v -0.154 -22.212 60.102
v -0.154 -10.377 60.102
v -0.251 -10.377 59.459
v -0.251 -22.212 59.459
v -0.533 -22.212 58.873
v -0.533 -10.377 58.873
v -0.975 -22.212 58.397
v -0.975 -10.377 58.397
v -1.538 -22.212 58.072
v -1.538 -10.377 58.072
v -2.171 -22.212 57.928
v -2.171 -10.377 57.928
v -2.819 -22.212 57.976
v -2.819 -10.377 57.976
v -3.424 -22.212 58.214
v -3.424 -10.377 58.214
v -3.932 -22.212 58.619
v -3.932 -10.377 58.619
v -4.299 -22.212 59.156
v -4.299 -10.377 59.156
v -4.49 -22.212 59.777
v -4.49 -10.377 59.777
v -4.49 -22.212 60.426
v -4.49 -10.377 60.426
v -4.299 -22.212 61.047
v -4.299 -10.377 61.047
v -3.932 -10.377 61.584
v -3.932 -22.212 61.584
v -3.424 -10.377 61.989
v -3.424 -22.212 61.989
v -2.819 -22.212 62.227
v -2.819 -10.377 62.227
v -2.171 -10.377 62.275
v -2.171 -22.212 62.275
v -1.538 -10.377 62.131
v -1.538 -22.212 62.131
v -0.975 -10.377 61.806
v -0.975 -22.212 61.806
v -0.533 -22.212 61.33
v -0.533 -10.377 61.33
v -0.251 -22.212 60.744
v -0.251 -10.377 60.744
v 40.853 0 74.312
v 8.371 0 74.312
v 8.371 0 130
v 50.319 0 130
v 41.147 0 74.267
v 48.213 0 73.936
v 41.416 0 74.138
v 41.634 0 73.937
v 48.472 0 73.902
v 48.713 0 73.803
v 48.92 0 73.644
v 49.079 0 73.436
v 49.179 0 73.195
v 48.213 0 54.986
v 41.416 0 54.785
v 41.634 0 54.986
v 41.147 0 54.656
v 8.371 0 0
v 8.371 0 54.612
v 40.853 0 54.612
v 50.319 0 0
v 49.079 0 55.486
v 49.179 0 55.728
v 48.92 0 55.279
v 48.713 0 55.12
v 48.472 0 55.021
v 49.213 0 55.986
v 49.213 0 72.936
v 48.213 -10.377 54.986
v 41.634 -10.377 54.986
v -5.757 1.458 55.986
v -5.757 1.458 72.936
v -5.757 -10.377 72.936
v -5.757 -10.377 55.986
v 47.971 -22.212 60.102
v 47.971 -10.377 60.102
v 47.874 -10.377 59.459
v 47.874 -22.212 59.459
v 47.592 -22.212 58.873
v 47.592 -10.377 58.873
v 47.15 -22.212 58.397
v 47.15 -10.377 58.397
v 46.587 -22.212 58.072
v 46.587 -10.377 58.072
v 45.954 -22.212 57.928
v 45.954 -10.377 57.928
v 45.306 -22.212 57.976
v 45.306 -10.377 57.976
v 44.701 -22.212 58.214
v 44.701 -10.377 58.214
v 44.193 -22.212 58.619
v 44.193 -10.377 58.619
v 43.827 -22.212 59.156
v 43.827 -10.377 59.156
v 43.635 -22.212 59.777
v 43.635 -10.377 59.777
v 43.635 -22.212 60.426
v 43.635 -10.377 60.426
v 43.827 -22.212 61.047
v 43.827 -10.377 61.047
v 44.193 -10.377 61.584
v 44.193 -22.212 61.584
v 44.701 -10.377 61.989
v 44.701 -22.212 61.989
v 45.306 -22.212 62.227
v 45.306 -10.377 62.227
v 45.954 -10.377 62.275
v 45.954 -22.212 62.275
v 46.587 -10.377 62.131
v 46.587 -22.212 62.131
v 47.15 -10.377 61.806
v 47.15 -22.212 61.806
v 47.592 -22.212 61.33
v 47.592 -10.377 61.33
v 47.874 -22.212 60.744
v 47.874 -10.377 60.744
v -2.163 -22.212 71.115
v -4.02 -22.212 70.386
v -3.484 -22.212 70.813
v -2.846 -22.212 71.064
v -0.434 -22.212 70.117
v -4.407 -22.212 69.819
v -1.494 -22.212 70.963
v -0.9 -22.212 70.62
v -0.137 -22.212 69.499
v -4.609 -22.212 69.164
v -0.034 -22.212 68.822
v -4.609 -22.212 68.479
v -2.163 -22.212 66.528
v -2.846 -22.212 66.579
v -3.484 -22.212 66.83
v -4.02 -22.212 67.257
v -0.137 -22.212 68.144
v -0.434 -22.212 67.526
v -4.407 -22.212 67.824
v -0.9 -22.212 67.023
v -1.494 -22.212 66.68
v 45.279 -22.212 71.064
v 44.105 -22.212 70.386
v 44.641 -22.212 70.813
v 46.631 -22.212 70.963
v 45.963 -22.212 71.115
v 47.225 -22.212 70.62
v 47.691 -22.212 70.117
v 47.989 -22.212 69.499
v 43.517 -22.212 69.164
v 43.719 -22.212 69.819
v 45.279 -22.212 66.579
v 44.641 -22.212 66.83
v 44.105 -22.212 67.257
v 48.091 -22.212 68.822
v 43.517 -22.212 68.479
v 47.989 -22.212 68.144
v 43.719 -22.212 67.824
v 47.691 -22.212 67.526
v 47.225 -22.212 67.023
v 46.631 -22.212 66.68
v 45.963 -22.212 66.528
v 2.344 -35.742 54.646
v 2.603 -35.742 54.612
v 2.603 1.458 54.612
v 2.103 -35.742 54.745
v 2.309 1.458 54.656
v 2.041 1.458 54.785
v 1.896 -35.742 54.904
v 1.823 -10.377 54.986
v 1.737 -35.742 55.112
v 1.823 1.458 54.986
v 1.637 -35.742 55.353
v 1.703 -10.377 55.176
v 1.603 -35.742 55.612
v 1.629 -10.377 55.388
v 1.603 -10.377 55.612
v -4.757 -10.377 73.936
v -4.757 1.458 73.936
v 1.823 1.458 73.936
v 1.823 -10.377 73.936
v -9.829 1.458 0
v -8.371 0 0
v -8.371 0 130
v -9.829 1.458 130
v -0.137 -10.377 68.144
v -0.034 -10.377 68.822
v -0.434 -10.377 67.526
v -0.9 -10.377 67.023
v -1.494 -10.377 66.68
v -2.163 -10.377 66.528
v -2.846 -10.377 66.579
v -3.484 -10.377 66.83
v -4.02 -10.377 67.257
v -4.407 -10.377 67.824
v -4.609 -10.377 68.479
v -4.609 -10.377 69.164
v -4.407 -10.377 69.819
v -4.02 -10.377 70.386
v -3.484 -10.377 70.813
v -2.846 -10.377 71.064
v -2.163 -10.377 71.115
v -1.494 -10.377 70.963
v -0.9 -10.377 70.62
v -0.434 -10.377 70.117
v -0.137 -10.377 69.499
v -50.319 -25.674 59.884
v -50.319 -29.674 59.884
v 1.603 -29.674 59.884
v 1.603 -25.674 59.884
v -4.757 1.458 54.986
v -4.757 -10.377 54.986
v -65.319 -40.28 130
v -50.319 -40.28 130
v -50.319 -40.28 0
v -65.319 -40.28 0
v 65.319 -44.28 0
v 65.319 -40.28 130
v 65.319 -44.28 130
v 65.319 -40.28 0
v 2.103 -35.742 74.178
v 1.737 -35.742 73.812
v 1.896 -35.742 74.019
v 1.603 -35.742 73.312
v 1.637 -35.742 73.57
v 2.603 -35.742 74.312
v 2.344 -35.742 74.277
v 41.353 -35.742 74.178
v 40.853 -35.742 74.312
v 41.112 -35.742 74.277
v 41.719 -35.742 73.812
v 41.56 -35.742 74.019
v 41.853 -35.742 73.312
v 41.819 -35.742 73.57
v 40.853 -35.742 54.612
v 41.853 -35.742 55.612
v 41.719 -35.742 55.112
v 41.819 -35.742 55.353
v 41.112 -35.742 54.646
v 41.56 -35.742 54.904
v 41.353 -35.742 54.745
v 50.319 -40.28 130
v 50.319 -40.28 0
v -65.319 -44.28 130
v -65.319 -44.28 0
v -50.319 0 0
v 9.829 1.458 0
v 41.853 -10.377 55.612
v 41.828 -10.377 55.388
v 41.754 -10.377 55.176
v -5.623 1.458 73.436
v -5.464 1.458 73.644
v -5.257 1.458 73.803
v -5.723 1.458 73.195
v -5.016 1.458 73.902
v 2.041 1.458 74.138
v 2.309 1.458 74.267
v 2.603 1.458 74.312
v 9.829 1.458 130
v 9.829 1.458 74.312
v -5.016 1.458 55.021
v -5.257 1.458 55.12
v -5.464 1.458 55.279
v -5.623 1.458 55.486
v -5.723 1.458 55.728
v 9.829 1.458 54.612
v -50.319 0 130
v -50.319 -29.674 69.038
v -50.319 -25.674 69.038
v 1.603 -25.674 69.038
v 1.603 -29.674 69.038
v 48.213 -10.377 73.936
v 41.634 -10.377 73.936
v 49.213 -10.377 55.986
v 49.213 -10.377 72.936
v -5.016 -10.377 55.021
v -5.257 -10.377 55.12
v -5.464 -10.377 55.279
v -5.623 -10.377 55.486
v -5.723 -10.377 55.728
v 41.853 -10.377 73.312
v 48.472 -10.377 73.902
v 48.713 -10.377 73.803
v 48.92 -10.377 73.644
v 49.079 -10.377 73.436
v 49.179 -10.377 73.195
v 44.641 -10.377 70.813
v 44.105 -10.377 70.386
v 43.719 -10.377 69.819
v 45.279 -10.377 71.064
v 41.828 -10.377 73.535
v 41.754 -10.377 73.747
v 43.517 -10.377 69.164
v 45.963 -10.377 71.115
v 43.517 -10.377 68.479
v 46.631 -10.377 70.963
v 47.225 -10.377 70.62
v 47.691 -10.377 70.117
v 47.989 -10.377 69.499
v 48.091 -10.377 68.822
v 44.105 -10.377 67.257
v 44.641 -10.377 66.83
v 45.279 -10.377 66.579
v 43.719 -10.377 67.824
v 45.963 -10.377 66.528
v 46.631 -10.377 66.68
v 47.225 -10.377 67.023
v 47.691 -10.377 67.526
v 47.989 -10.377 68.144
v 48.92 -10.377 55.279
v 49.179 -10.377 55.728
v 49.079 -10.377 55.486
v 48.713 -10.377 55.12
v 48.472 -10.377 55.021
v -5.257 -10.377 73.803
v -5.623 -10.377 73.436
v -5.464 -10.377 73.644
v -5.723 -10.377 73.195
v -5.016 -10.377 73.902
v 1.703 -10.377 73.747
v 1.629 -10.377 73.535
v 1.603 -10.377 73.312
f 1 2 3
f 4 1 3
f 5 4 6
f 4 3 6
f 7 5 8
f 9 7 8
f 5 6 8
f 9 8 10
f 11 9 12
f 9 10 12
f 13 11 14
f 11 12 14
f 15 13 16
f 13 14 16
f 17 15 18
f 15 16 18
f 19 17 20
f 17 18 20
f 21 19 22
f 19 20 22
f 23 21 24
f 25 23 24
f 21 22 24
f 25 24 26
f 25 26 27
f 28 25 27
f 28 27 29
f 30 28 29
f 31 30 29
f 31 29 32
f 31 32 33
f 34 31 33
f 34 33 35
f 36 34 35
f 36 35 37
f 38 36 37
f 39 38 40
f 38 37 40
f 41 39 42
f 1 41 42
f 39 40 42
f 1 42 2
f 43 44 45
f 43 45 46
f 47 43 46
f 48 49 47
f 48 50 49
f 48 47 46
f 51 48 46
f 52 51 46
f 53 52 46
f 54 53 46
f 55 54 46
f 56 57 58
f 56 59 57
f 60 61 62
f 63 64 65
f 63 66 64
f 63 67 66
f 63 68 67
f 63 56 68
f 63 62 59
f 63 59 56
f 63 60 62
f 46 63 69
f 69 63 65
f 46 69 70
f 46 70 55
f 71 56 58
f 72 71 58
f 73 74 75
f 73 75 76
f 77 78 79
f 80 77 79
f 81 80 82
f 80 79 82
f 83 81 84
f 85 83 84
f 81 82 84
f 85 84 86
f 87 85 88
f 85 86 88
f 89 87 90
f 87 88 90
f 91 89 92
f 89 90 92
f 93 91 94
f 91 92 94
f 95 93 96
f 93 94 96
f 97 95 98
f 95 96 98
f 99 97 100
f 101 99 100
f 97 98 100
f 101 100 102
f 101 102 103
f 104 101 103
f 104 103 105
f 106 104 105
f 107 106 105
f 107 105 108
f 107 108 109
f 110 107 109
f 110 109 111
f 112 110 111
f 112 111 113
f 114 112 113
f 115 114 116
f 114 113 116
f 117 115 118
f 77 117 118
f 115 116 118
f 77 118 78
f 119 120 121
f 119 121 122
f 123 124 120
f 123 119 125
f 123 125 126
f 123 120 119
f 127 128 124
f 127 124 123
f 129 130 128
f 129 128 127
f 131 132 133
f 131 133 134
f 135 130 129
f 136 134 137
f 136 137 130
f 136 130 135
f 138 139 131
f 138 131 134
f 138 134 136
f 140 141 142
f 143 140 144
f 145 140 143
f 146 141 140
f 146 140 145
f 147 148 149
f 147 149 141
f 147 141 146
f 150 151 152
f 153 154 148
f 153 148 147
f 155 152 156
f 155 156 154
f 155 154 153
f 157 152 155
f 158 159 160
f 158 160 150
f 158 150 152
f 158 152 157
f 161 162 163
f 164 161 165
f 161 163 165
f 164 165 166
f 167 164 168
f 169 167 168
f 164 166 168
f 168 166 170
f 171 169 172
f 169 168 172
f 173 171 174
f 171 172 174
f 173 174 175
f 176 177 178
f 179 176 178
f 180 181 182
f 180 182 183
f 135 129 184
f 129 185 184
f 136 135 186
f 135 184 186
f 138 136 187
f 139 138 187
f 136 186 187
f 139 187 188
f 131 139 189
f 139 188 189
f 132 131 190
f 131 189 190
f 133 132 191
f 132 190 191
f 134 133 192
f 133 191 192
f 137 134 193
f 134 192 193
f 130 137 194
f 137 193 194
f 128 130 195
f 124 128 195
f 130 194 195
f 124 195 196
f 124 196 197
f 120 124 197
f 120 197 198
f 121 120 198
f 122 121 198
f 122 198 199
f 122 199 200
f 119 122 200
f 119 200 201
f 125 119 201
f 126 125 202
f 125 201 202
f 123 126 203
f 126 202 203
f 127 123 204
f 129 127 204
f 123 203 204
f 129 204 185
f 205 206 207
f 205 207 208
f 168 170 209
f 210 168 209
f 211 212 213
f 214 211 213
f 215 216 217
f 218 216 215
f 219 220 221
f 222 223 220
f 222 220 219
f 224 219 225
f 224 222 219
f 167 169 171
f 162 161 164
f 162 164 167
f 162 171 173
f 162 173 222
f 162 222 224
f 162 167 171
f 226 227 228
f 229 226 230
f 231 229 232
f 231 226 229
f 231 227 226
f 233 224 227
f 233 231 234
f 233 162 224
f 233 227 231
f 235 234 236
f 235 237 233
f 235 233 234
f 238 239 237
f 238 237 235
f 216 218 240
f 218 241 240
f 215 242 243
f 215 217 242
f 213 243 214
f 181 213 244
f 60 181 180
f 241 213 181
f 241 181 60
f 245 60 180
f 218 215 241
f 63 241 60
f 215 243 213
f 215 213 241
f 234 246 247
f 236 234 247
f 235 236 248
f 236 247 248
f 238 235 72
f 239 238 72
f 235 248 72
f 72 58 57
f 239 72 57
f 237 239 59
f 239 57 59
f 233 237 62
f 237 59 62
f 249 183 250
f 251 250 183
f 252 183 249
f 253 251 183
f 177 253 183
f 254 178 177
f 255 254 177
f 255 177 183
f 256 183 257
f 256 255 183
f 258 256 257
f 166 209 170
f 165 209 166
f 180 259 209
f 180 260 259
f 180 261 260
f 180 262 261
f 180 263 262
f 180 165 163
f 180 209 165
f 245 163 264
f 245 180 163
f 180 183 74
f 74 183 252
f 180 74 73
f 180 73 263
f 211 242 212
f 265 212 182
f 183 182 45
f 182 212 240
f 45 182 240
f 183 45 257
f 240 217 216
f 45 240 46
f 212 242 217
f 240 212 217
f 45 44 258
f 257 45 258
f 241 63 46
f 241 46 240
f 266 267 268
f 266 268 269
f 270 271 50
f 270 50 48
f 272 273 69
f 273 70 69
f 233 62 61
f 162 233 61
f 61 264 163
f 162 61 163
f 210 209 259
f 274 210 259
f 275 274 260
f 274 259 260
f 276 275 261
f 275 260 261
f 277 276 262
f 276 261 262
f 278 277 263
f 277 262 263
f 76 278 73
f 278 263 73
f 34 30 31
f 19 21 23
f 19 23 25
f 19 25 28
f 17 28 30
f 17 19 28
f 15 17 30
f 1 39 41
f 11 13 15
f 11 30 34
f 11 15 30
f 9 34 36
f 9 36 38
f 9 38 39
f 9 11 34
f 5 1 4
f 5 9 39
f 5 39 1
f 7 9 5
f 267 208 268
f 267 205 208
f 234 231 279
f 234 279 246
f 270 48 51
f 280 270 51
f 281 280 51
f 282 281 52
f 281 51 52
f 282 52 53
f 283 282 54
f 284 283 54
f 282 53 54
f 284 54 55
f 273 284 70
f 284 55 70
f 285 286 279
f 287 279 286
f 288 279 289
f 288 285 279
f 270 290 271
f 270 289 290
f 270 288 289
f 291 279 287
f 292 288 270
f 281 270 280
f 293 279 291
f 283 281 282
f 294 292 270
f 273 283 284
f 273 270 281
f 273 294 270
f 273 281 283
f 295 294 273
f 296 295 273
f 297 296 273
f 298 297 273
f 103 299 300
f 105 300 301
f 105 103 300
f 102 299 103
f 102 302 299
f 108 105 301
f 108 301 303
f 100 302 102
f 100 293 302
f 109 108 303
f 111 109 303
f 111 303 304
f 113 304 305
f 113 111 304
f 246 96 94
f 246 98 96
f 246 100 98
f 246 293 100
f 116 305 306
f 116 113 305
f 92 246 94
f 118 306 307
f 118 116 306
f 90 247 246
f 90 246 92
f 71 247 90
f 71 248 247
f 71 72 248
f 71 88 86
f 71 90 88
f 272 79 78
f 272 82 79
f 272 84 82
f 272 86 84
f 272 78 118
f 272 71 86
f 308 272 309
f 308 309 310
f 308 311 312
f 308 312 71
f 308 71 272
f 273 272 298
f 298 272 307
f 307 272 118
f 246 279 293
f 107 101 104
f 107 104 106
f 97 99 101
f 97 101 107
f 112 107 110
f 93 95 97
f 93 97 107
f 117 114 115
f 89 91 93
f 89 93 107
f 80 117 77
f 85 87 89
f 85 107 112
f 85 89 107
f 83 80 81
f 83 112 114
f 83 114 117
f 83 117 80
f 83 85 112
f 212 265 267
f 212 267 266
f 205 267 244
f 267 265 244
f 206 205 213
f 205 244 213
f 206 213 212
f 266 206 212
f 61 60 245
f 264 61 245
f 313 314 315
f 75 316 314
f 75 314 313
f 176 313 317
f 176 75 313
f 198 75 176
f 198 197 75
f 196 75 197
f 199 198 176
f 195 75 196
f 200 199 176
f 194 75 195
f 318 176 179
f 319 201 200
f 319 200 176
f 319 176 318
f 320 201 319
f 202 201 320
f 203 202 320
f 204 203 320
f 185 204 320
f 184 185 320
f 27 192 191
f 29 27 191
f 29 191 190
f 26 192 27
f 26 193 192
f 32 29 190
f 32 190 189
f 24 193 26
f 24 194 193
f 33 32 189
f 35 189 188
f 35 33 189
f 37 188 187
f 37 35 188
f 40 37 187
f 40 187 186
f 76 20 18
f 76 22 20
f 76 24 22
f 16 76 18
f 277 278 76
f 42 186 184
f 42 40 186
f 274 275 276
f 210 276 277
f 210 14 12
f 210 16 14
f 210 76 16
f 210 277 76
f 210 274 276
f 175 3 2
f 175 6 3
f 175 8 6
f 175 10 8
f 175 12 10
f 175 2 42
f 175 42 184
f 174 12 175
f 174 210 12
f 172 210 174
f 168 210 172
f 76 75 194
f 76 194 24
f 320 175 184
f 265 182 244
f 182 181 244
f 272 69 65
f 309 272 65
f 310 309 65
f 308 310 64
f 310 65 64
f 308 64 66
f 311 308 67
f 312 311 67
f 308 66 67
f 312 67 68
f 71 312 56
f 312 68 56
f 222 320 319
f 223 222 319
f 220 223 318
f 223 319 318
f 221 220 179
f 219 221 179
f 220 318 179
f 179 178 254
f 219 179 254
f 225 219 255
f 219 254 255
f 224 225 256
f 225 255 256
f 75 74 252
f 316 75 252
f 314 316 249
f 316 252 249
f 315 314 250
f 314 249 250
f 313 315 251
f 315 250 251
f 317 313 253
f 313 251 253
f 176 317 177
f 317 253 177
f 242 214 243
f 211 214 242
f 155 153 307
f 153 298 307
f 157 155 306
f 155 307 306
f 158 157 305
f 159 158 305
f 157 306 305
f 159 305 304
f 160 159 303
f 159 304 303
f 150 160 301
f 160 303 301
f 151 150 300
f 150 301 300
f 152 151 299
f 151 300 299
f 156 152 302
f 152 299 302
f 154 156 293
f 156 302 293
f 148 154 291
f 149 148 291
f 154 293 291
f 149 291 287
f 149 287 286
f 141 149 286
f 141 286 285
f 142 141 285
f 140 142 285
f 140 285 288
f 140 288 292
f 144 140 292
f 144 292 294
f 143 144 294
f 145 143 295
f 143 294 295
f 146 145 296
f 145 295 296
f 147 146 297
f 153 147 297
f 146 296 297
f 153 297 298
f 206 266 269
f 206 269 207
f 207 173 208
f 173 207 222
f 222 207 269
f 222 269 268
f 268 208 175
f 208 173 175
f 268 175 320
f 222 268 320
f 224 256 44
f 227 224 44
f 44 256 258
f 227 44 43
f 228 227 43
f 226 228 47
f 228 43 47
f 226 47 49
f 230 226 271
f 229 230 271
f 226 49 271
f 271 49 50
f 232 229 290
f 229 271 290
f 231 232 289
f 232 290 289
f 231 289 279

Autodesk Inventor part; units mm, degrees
ref_plane "XZ Plane" through (0, 0, 0) normal (0, 1, 0) x (-1, 0, 0)
ref_plane "XY Plane" through (0, 0, 0) normal (0, 0, 1) x (1, 0, 0)
sketch "Sketch1" plane through (0, 0, 0) normal (0, 0, 1) x (1, 0, 0)
  line L0 (-9.963, 1.5182) -> (9.963, 1.5182) construction
  line L1 (9.963, 1.5182) -> (8.4447, 0) construction
  line L2 (18.795, 0) -> (8.4447, 0) construction
  line L3 (21.97, 0) -> (18.795, 0) construction
  line L4 (21.97, 0) -> (21.97, 26.825) construction
  line L5 (18.795, 30) -> (21.97, 26.825) construction
  line L6 (18.795, 30) -> (-18.795, 30) construction
  line L7 (-21.97, 26.825) -> (-18.795, 30) construction
  line L8 (-21.97, 26.825) -> (-21.97, 0) construction
  line L9 (-18.795, 0) -> (-21.97, 0) construction
  line L10 (-8.4447, 0) -> (-18.795, 0) construction
  line L11 (8.85, 30) -> (8.85, 2) construction
  line L12 (-9.85, 30) -> (-9.85, 2) construction
  line L13 (-8.4447, 0) -> (-9.963, 1.5182) construction
  point P0 (0, 0)
  point P1 (0, 0)
sketch "Sketch2" plane through (0, 0, 0) normal (0, 0, 1) x (1, 0, 0)
  line L0 (24.03, 0.5901) -> (24.03, 6.9401) construction
  line L1 (38.1011, 0.5901) -> (38.1011, 6.9401) construction
  line L2 (40.9704, -9.5093) -> (40.9704, -4.8619) construction
  line L3 (40.9704, -9.5093) -> (47.3304, -9.5093) construction
  line L4 (40.9704, -10.7393) -> (47.3304, -10.7393) construction
  line L5 (40.9704, -37.5619) -> (40.9704, -10.7393) construction
  line L6 (39.9704, -37.5619) -> (1.7204, -37.5619) construction
  line L7 (0.7204, -10.7393) -> (0.7204, -37.5619) construction
  line L8 (0.7204, -4.8619) -> (0.7204, -9.5093) construction
  line L9 (0.9398, -10.7393) -> (-5.6396, -10.7393) construction
  line L10 (39.9704, -3.8619) -> (1.7204, -3.8619) construction
  line L11 (10.9571, -1.3619) -> (31.1204, -1.3619) construction
  line L12 (8.4344, 0) -> (50.3188, 0)
  line L13 (50.3188, 0) -> (50.3188, -44.2799)
  line L14 (50.3188, -44.2799) -> (0, -44.2799)
  line L15 (8.4344, 0) -> (8.3708, 0)
  line L16 (8.3708, 0) -> (9.8292, 1.4584)
  line L17 (9.8292, 1.4584) -> (0, 1.4584)
  line L18 (-8.4344, 0) -> (-50.3188, 0)
  line L19 (-50.3188, 0) -> (-50.3188, -44.2799)
  line L20 (-50.3188, -44.2799) -> (0, -44.2799)
  line L21 (-8.3708, 0) -> (-9.8292, 1.4584)
  line L22 (-9.8292, 1.4584) -> (0, 1.4584)
  line L23 (-8.3708, 0) -> (-8.4344, 0)
  point P0 (0, 0)
  point P1 (37.3029, -27.4984)
  dimension "d0" = 41.8844
  dimension "d1" = 45
  dimension "d2" = 45
extrude "Extrusion1" add sketch "Sketch2" along normal blind 130
sketch "Sketch6" plane through (-9.8292, 1.4584, 0) normal (0, 1, 0) x (1, 0, 0)
  line L0 (1, -74.6503) -> (18.7, -74.6503) construction
  line L1 (19.7, -75.6503) -> (19.7, -113.9003) construction
  line L2 (0, -113.9003) -> (0, -75.6503) construction
  line L3 (-8.945, -124.6123) -> (-8.945, -5.3877) construction
  line L4 (-12.12, -5.3877) -> (-12.12, -124.6123) construction
  line L5 (28.645, -127.7873) -> (-8.945, -127.7873) construction
  line L6 (-12.12, -127.7873) -> (-8.945, -127.7873) construction
  line L7 (31.82, -124.6123) -> (31.82, -5.3877) construction
  line L8 (28.645, -2.2127) -> (-8.945, -2.2127) construction
  arc A0 (31.82, -5.3877) -> (28.645, -2.2127) centre (28.645, -5.3877) ccw construction
  arc A1 (-8.945, -2.2127) -> (-12.12, -5.3877) centre (-8.945, -5.3877) ccw construction
  arc A2 (28.645, -127.7873) -> (31.82, -124.6123) centre (28.645, -124.6123) ccw construction
  line L9 (0, -54.423) -> (0, -16.173) construction
  line L10 (50.6825, -54.6115) -> (12.4325, -54.6115)
  arc A3 (51.6825, -55.6115) -> (50.6825, -54.6115) centre (50.6825, -55.6115) ccw
  line L11 (51.6825, -73.3115) -> (51.6825, -55.6115)
  arc A4 (50.6825, -74.3115) -> (51.6825, -73.3115) centre (50.6825, -73.3115) ccw
  line L12 (12.4325, -74.3115) -> (50.6825, -74.3115)
  arc A5 (11.4325, -73.3115) -> (12.4325, -74.3115) centre (12.4325, -73.3115) ccw
  line L13 (11.4325, -55.6115) -> (11.4325, -73.3115)
  arc A6 (12.4325, -54.6115) -> (11.4325, -55.6115) centre (12.4325, -55.6115) ccw
  circle A7 centre (41.8325, -64.4615) radius 6.44 construction
  circle A8 centre (0, 0) radius 5.44 construction
  line L14 (51.6825, -54.9865) -> (58.0425, -54.9865) construction
  arc A9 (59.0425, -55.9865) -> (58.0425, -54.9865) centre (58.0425, -55.9865) ccw construction
  line L15 (59.0425, -72.9365) -> (59.0425, -55.9865) construction
  arc A10 (58.0425, -73.9365) -> (59.0425, -72.9365) centre (58.0425, -72.9365) ccw construction
  line L16 (51.6825, -73.9365) -> (58.0425, -73.9365) construction
  circle A11 centre (55.6202, -68.8215) radius 2.3 construction
  circle A12 centre (55.6202, -60.1015) radius 2.18 construction
  line L17 (11.6519, -54.9865) -> (5.0725, -54.9865) construction
  arc A13 (5.0725, -54.9865) -> (4.0725, -55.9865) centre (5.0725, -55.9865) ccw construction
  line L18 (4.0725, -72.9365) -> (4.0725, -55.9865) construction
  circle A14 centre (7.4948, -60.1015) radius 2.18 construction
  circle A15 centre (7.4948, -68.8215) radius 2.3 construction
  line L19 (5.0725, -73.9365) -> (11.6519, -73.9365) construction
  arc A16 (4.0725, -72.9365) -> (5.0725, -73.9365) centre (5.0725, -72.9365) ccw construction
  circle A17 centre (0, 0) radius 4.4768 construction
  line L20 (-5.3547, -0.1836) -> (-7.032, -1.2649) construction
  line L21 (-7.032, -1.2649) -> (-6.8876, -1.9) construction
  line L22 (-6.8876, -1.9) -> (-4.9076, -2.1498) construction
  line L23 (-7.0904, 0.8803) -> (-5.3567, -0.1081) construction
  line L24 (-6.9808, 1.5224) -> (-7.0904, 0.8803) construction
  line L25 (-5.0173, 1.8795) -> (-6.9808, 1.5224) construction
  line L26 (7.032, 1.2649) -> (6.8876, 1.9) construction
  line L27 (6.8876, 1.9) -> (4.9076, 2.1498) construction
  line L28 (5.3547, 0.1836) -> (7.032, 1.2649) construction
  line L29 (-7.032, -1.2649) -> (-6.8876, -1.9) construction
  line L30 (-6.9808, 1.5224) -> (-7.0904, 0.8803) construction
  line L31 (-5.3547, -0.1836) -> (-7.032, -1.2649) construction
  line L32 (-5.0173, 1.8795) -> (-6.9808, 1.5224) construction
  line L33 (60.148, 0) -> (-40.4896, 0) construction
  line L34 (9.85, -65) -> (23.9886, -65) construction
  point P0 (9.8292, 0)
  point P1 (-10.275, 0)
ref_plane "Work Plane1" through (8.3708, 0, 0) normal (0, 1, 0) x (1, 0, 0)
extrude "Extrusion2" cut sketch "Sketch6" against normal blind 37.2
sketch "Sketch7" plane through (8.3708, 0, 0) normal (0, 1, 0) x (1, 0, 0)
  point P0 (-8.3708, 0)
sketch "Sketch8" plane through (-9.8292, -35.7416, 0) normal (0, 1, 0) x (1, 0, 0)
  point P0 (9.8292, 0)
sketch "Sketch9" plane through (-9.8292, 1.4584, 0) normal (0, 1, 0) x (1, 0, 0)
  line L0 (1, -74.6503) -> (18.7, -74.6503) construction
  line L1 (19.7, -75.6503) -> (19.7, -113.9003) construction
  line L2 (0, -113.9003) -> (0, -75.6503) construction
  line L3 (-8.945, -124.6123) -> (-8.945, -5.3877) construction
  line L4 (-12.12, -5.3877) -> (-12.12, -124.6123) construction
  line L5 (28.645, -127.7873) -> (-8.945, -127.7873) construction
  line L6 (-12.12, -127.7873) -> (-8.945, -127.7873) construction
  line L7 (31.82, -124.6123) -> (31.82, -5.3877) construction
  line L8 (28.645, -2.2127) -> (-8.945, -2.2127) construction
  arc A0 (31.82, -5.3877) -> (28.645, -2.2127) centre (28.645, -5.3877) ccw construction
  arc A1 (-8.945, -2.2127) -> (-12.12, -5.3877) centre (-8.945, -5.3877) ccw construction
  arc A2 (28.645, -127.7873) -> (31.82, -124.6123) centre (28.645, -124.6123) ccw construction
  line L9 (0, -54.423) -> (0, -16.173) construction
  line L10 (50.6825, -54.6115) -> (12.4325, -54.6115) construction
  arc A3 (51.6825, -55.6115) -> (50.6825, -54.6115) centre (50.6825, -55.6115) ccw construction
  line L11 (51.6825, -73.3115) -> (51.6825, -55.6115)
  arc A4 (50.6825, -74.3115) -> (51.6825, -73.3115) centre (50.6825, -73.3115) ccw construction
  line L12 (12.4325, -74.3115) -> (50.6825, -74.3115) construction
  arc A5 (11.4325, -73.3115) -> (12.4325, -74.3115) centre (12.4325, -73.3115) ccw construction
  line L13 (11.4325, -55.6115) -> (11.4325, -73.3115)
  arc A6 (12.4325, -54.6115) -> (11.4325, -55.6115) centre (12.4325, -55.6115) ccw construction
  circle A7 centre (41.8325, -64.4615) radius 6.44 construction
  circle A8 centre (0, 0) radius 5.44 construction
  line L14 (51.6825, -54.9865) -> (58.0425, -54.9865)
  arc A9 (59.0425, -55.9865) -> (58.0425, -54.9865) centre (58.0425, -55.9865) ccw
  line L15 (59.0425, -72.9365) -> (59.0425, -55.9865)
  arc A10 (58.0425, -73.9365) -> (59.0425, -72.9365) centre (58.0425, -72.9365) ccw
  line L16 (51.6825, -73.9365) -> (58.0425, -73.9365)
  circle A11 centre (55.6202, -68.8215) radius 2.3 construction
  circle A12 centre (55.6202, -60.1015) radius 2.18 construction
  line L17 (11.6519, -54.9865) -> (5.0725, -54.9865)
  arc A13 (5.0725, -54.9865) -> (4.0725, -55.9865) centre (5.0725, -55.9865) ccw
  line L18 (4.0725, -72.9365) -> (4.0725, -55.9865)
  circle A14 centre (7.4948, -60.1015) radius 2.18 construction
  circle A15 centre (7.4948, -68.8215) radius 2.3 construction
  line L19 (5.0725, -73.9365) -> (11.6519, -73.9365)
  arc A16 (4.0725, -72.9365) -> (5.0725, -73.9365) centre (5.0725, -72.9365) ccw
  circle A17 centre (0, 0) radius 4.4768 construction
  line L20 (-5.3547, -0.1836) -> (-7.032, -1.2649) construction
  line L21 (-7.032, -1.2649) -> (-6.8876, -1.9) construction
  line L22 (-6.8876, -1.9) -> (-4.9076, -2.1498) construction
  line L23 (-7.0904, 0.8803) -> (-5.3567, -0.1081) construction
  line L24 (-6.9808, 1.5224) -> (-7.0904, 0.8803) construction
  line L25 (-5.0173, 1.8795) -> (-6.9808, 1.5224) construction
  line L26 (7.032, 1.2649) -> (6.8876, 1.9) construction
  line L27 (6.8876, 1.9) -> (4.9076, 2.1498) construction
  line L28 (5.3547, 0.1836) -> (7.032, 1.2649) construction
  line L29 (-7.032, -1.2649) -> (-6.8876, -1.9) construction
  line L30 (-6.9808, 1.5224) -> (-7.0904, 0.8803) construction
  line L31 (-5.3547, -0.1836) -> (-7.032, -1.2649) construction
  line L32 (-5.0173, 1.8795) -> (-6.9808, 1.5224) construction
  line L33 (60.148, 0) -> (-40.4896, 0) construction
  line L34 (9.85, -65) -> (23.9886, -65) construction
  line L35 (51.6825, -73.9365) -> (51.4631, -73.9365)
  arc A18 (50.6825, -74.3115) -> (51.6825, -73.3115) centre (50.6825, -73.3115) ccw construction
  line L36 (51.6825, -54.9865) -> (51.4631, -54.9865)
  line L37 (51.6825, -55.6115) -> (51.6825, -73.3115) projected
  arc A19 (51.6825, -55.6115) -> (51.4631, -54.9865) centre (50.6825, -55.6115) ccw
  arc A20 (51.4631, -73.9365) -> (51.6825, -73.3115) centre (50.6825, -73.3115) ccw
  arc A21 (11.4325, -73.3115) -> (11.6519, -73.9365) centre (12.4325, -73.3115) ccw
  arc A22 (11.6519, -54.9865) -> (11.4325, -55.6115) centre (12.4325, -55.6115) ccw
  point P0 (9.8292, 0)
  point P1 (9.8292, 0)
  point P2 (-10.275, 0)
sketch "Sketch10" plane through (0, 0, 130) normal (0, 0, 1) x (1, 0, 0)
  line L0 (-70.4463, 0) -> (70.4463, 0) projected
  line L1 (9.8292, 1.4584) -> (-9.8292, 1.4584) projected
  point P0 (0, 0)
  dimension "d8" = 1.4584
extrude "Extrusion3" cut sketch "Sketch9" against normal blind 11.835
sketch "Sketch11" plane through (0, 0, 130) normal (0, 0, 1) x (1, 0, 0)
  line L0 (-4.7567, 1.4584) -> (-4.7567, -10.3766) projected
  line L1 (41.6339, 0) -> (41.6339, -10.3766) projected
  point P0 (0, 0)
sketch "Sketch12" plane through (-9.8292, -10.3766, 0) normal (0, 1, 0) x (1, 0, 0)
  point P0 (9.8292, 0)
sketch "Sketch13" plane through (-9.8292, -10.3766, 0) normal (0, 1, 0) x (1, 0, 0)
  point P0 (9.8292, 0)
sketch "Sketch14" plane through (-9.8292, -10.3766, 0) normal (0, 1, 0) x (1, 0, 0)
  line L0 (1, -74.6503) -> (18.7, -74.6503) construction
  line L1 (19.7, -75.6503) -> (19.7, -113.9003) construction
  line L2 (0, -113.9003) -> (0, -75.6503) construction
  line L3 (-8.945, -124.6123) -> (-8.945, -5.3877) construction
  line L4 (-12.12, -5.3877) -> (-12.12, -124.6123) construction
  line L5 (28.645, -127.7873) -> (-8.945, -127.7873) construction
  line L6 (-12.12, -127.7873) -> (-8.945, -127.7873) construction
  line L7 (31.82, -124.6123) -> (31.82, -5.3877) construction
  line L8 (28.645, -2.2127) -> (-8.945, -2.2127) construction
  arc A0 (31.82, -5.3877) -> (28.645, -2.2127) centre (28.645, -5.3877) ccw construction
  arc A1 (-8.945, -2.2127) -> (-12.12, -5.3877) centre (-8.945, -5.3877) ccw construction
  arc A2 (28.645, -127.7873) -> (31.82, -124.6123) centre (28.645, -124.6123) ccw construction
  line L9 (0, -54.423) -> (0, -16.173) construction
  line L10 (50.6825, -54.6115) -> (12.4325, -54.6115) construction
  arc A3 (51.6825, -55.6115) -> (50.6825, -54.6115) centre (50.6825, -55.6115) ccw construction
  line L11 (51.6825, -73.3115) -> (51.6825, -55.6115) construction
  arc A4 (50.6825, -74.3115) -> (51.6825, -73.3115) centre (50.6825, -73.3115) ccw construction
  line L12 (12.4325, -74.3115) -> (50.6825, -74.3115) construction
  arc A5 (11.4325, -73.3115) -> (12.4325, -74.3115) centre (12.4325, -73.3115) ccw construction
  line L13 (11.4325, -55.6115) -> (11.4325, -73.3115) construction
  arc A6 (12.4325, -54.6115) -> (11.4325, -55.6115) centre (12.4325, -55.6115) ccw construction
  circle A7 centre (41.8325, -64.4615) radius 6.44 construction
  circle A8 centre (0, 0) radius 5.44 construction
  line L14 (51.6825, -54.9865) -> (58.0425, -54.9865) construction
  arc A9 (59.0425, -55.9865) -> (58.0425, -54.9865) centre (58.0425, -55.9865) ccw construction
  line L15 (59.0425, -72.9365) -> (59.0425, -55.9865) construction
  arc A10 (58.0425, -73.9365) -> (59.0425, -72.9365) centre (58.0425, -72.9365) ccw construction
  line L16 (51.6825, -73.9365) -> (58.0425, -73.9365) construction
  circle A11 centre (55.6202, -68.8215) radius 2.3
  circle A12 centre (55.6202, -60.1015) radius 2.18
  line L17 (11.6519, -54.9865) -> (5.0725, -54.9865) construction
  arc A13 (5.0725, -54.9865) -> (4.0725, -55.9865) centre (5.0725, -55.9865) ccw construction
  line L18 (4.0725, -72.9365) -> (4.0725, -55.9865) construction
  circle A14 centre (7.4948, -60.1015) radius 2.18
  circle A15 centre (7.4948, -68.8215) radius 2.3
  line L19 (5.0725, -73.9365) -> (11.6519, -73.9365) construction
  arc A16 (4.0725, -72.9365) -> (5.0725, -73.9365) centre (5.0725, -72.9365) ccw construction
  circle A17 centre (0, 0) radius 4.4768 construction
  line L20 (-5.3547, -0.1836) -> (-7.032, -1.2649) construction
  line L21 (-7.032, -1.2649) -> (-6.8876, -1.9) construction
  line L22 (-6.8876, -1.9) -> (-4.9076, -2.1498) construction
  line L23 (-7.0904, 0.8803) -> (-5.3567, -0.1081) construction
  line L24 (-6.9808, 1.5224) -> (-7.0904, 0.8803) construction
  line L25 (-5.0173, 1.8795) -> (-6.9808, 1.5224) construction
  line L26 (7.032, 1.2649) -> (6.8876, 1.9) construction
  line L27 (6.8876, 1.9) -> (4.9076, 2.1498) construction
  line L28 (5.3547, 0.1836) -> (7.032, 1.2649) construction
  line L29 (-7.032, -1.2649) -> (-6.8876, -1.9) construction
  line L30 (-6.9808, 1.5224) -> (-7.0904, 0.8803) construction
  line L31 (-5.3547, -0.1836) -> (-7.032, -1.2649) construction
  line L32 (-5.0173, 1.8795) -> (-6.9808, 1.5224) construction
  line L33 (60.148, 0) -> (-40.4896, 0) construction
  line L34 (9.85, -65) -> (23.9886, -65) construction
  line L35 (51.6825, -73.9365) -> (51.4631, -73.9365) construction
  arc A18 (50.6825, -74.3115) -> (51.6825, -73.3115) centre (50.6825, -73.3115) ccw construction
  line L36 (51.6825, -54.9865) -> (51.4631, -54.9865) construction
  line L37 (51.6825, -55.6115) -> (51.6825, -73.3115) construction
  arc A19 (51.6825, -55.6115) -> (51.4631, -54.9865) centre (50.6825, -55.6115) ccw construction
  arc A20 (51.4631, -73.9365) -> (51.6825, -73.3115) centre (50.6825, -73.3115) ccw construction
  arc A21 (11.4325, -73.3115) -> (11.6519, -73.9365) centre (12.4325, -73.3115) ccw construction
  arc A22 (11.6519, -54.9865) -> (11.4325, -55.6115) centre (12.4325, -55.6115) ccw construction
  point P0 (9.8292, 0)
  point P1 (9.8292, 0)
  point P2 (9.8292, 0)
  point P3 (-10.275, 0)
extrude "Extrusion4" cut sketch "Sketch14" against normal blind 11.835
sketch "Sketch15" plane through (50.3188, -44.2799, 0) normal (1, 0, 0) x (0, 0, -1)
  line L0 (0, 0) -> (-130, 0) projected
  line L1 (0, 44.2799) -> (0, 0) projected
  line L2 (-130, 0) -> (0, 0)
  line L3 (0, 0) -> (0, 4)
  line L4 (0, 4) -> (-130, 4)
  line L5 (-130, 4) -> (-130, 0)
  dimension "d13" = 4
extrude "Extrusion5" add sketch "Sketch15" along normal blind 15
mirror "Mirror1" about plane through (0, 0, 0) normal (1, 0, 0) of "Extrusion5"
sketch "Sketch16" plane through (-50.3188, 0, 0) normal (-1, 0, 0) x (0, 0, 1)
  line L0 (55.6115, -10.3766) -> (55.6115, -35.7416) construction
  line L1 (73.3115, -10.3766) -> (73.3115, -35.7416) construction
  line L2 (55.6115, -35.7416) -> (73.3115, -35.7416) construction
  line L3 (55.6115, -25.7416) -> (73.3115, -25.7416) construction
  line L4 (59.8845, -25.6737) -> (69.0385, -25.6737)
  line L5 (69.0385, -25.6737) -> (69.0385, -29.6737)
  line L6 (69.0385, -29.6737) -> (59.8845, -29.6737)
  line L7 (59.8845, -29.6737) -> (59.8845, -25.6737)
  line L8 (59.8845, -25.6737) -> (69.0385, -29.6737) construction
  line L9 (69.0385, -25.6737) -> (59.8845, -29.6737) construction
  point P0 (0, 0)
  point P1 (64.4615, -25.7416)
  point P2 (64.4615, -27.6737)
  dimension "d16" = 10
  dimension "d17" = 4
extrude "Extrusion6" cut sketch "Sketch16" against normal blind 59.45
properties part number "plateau_coulisseant"
